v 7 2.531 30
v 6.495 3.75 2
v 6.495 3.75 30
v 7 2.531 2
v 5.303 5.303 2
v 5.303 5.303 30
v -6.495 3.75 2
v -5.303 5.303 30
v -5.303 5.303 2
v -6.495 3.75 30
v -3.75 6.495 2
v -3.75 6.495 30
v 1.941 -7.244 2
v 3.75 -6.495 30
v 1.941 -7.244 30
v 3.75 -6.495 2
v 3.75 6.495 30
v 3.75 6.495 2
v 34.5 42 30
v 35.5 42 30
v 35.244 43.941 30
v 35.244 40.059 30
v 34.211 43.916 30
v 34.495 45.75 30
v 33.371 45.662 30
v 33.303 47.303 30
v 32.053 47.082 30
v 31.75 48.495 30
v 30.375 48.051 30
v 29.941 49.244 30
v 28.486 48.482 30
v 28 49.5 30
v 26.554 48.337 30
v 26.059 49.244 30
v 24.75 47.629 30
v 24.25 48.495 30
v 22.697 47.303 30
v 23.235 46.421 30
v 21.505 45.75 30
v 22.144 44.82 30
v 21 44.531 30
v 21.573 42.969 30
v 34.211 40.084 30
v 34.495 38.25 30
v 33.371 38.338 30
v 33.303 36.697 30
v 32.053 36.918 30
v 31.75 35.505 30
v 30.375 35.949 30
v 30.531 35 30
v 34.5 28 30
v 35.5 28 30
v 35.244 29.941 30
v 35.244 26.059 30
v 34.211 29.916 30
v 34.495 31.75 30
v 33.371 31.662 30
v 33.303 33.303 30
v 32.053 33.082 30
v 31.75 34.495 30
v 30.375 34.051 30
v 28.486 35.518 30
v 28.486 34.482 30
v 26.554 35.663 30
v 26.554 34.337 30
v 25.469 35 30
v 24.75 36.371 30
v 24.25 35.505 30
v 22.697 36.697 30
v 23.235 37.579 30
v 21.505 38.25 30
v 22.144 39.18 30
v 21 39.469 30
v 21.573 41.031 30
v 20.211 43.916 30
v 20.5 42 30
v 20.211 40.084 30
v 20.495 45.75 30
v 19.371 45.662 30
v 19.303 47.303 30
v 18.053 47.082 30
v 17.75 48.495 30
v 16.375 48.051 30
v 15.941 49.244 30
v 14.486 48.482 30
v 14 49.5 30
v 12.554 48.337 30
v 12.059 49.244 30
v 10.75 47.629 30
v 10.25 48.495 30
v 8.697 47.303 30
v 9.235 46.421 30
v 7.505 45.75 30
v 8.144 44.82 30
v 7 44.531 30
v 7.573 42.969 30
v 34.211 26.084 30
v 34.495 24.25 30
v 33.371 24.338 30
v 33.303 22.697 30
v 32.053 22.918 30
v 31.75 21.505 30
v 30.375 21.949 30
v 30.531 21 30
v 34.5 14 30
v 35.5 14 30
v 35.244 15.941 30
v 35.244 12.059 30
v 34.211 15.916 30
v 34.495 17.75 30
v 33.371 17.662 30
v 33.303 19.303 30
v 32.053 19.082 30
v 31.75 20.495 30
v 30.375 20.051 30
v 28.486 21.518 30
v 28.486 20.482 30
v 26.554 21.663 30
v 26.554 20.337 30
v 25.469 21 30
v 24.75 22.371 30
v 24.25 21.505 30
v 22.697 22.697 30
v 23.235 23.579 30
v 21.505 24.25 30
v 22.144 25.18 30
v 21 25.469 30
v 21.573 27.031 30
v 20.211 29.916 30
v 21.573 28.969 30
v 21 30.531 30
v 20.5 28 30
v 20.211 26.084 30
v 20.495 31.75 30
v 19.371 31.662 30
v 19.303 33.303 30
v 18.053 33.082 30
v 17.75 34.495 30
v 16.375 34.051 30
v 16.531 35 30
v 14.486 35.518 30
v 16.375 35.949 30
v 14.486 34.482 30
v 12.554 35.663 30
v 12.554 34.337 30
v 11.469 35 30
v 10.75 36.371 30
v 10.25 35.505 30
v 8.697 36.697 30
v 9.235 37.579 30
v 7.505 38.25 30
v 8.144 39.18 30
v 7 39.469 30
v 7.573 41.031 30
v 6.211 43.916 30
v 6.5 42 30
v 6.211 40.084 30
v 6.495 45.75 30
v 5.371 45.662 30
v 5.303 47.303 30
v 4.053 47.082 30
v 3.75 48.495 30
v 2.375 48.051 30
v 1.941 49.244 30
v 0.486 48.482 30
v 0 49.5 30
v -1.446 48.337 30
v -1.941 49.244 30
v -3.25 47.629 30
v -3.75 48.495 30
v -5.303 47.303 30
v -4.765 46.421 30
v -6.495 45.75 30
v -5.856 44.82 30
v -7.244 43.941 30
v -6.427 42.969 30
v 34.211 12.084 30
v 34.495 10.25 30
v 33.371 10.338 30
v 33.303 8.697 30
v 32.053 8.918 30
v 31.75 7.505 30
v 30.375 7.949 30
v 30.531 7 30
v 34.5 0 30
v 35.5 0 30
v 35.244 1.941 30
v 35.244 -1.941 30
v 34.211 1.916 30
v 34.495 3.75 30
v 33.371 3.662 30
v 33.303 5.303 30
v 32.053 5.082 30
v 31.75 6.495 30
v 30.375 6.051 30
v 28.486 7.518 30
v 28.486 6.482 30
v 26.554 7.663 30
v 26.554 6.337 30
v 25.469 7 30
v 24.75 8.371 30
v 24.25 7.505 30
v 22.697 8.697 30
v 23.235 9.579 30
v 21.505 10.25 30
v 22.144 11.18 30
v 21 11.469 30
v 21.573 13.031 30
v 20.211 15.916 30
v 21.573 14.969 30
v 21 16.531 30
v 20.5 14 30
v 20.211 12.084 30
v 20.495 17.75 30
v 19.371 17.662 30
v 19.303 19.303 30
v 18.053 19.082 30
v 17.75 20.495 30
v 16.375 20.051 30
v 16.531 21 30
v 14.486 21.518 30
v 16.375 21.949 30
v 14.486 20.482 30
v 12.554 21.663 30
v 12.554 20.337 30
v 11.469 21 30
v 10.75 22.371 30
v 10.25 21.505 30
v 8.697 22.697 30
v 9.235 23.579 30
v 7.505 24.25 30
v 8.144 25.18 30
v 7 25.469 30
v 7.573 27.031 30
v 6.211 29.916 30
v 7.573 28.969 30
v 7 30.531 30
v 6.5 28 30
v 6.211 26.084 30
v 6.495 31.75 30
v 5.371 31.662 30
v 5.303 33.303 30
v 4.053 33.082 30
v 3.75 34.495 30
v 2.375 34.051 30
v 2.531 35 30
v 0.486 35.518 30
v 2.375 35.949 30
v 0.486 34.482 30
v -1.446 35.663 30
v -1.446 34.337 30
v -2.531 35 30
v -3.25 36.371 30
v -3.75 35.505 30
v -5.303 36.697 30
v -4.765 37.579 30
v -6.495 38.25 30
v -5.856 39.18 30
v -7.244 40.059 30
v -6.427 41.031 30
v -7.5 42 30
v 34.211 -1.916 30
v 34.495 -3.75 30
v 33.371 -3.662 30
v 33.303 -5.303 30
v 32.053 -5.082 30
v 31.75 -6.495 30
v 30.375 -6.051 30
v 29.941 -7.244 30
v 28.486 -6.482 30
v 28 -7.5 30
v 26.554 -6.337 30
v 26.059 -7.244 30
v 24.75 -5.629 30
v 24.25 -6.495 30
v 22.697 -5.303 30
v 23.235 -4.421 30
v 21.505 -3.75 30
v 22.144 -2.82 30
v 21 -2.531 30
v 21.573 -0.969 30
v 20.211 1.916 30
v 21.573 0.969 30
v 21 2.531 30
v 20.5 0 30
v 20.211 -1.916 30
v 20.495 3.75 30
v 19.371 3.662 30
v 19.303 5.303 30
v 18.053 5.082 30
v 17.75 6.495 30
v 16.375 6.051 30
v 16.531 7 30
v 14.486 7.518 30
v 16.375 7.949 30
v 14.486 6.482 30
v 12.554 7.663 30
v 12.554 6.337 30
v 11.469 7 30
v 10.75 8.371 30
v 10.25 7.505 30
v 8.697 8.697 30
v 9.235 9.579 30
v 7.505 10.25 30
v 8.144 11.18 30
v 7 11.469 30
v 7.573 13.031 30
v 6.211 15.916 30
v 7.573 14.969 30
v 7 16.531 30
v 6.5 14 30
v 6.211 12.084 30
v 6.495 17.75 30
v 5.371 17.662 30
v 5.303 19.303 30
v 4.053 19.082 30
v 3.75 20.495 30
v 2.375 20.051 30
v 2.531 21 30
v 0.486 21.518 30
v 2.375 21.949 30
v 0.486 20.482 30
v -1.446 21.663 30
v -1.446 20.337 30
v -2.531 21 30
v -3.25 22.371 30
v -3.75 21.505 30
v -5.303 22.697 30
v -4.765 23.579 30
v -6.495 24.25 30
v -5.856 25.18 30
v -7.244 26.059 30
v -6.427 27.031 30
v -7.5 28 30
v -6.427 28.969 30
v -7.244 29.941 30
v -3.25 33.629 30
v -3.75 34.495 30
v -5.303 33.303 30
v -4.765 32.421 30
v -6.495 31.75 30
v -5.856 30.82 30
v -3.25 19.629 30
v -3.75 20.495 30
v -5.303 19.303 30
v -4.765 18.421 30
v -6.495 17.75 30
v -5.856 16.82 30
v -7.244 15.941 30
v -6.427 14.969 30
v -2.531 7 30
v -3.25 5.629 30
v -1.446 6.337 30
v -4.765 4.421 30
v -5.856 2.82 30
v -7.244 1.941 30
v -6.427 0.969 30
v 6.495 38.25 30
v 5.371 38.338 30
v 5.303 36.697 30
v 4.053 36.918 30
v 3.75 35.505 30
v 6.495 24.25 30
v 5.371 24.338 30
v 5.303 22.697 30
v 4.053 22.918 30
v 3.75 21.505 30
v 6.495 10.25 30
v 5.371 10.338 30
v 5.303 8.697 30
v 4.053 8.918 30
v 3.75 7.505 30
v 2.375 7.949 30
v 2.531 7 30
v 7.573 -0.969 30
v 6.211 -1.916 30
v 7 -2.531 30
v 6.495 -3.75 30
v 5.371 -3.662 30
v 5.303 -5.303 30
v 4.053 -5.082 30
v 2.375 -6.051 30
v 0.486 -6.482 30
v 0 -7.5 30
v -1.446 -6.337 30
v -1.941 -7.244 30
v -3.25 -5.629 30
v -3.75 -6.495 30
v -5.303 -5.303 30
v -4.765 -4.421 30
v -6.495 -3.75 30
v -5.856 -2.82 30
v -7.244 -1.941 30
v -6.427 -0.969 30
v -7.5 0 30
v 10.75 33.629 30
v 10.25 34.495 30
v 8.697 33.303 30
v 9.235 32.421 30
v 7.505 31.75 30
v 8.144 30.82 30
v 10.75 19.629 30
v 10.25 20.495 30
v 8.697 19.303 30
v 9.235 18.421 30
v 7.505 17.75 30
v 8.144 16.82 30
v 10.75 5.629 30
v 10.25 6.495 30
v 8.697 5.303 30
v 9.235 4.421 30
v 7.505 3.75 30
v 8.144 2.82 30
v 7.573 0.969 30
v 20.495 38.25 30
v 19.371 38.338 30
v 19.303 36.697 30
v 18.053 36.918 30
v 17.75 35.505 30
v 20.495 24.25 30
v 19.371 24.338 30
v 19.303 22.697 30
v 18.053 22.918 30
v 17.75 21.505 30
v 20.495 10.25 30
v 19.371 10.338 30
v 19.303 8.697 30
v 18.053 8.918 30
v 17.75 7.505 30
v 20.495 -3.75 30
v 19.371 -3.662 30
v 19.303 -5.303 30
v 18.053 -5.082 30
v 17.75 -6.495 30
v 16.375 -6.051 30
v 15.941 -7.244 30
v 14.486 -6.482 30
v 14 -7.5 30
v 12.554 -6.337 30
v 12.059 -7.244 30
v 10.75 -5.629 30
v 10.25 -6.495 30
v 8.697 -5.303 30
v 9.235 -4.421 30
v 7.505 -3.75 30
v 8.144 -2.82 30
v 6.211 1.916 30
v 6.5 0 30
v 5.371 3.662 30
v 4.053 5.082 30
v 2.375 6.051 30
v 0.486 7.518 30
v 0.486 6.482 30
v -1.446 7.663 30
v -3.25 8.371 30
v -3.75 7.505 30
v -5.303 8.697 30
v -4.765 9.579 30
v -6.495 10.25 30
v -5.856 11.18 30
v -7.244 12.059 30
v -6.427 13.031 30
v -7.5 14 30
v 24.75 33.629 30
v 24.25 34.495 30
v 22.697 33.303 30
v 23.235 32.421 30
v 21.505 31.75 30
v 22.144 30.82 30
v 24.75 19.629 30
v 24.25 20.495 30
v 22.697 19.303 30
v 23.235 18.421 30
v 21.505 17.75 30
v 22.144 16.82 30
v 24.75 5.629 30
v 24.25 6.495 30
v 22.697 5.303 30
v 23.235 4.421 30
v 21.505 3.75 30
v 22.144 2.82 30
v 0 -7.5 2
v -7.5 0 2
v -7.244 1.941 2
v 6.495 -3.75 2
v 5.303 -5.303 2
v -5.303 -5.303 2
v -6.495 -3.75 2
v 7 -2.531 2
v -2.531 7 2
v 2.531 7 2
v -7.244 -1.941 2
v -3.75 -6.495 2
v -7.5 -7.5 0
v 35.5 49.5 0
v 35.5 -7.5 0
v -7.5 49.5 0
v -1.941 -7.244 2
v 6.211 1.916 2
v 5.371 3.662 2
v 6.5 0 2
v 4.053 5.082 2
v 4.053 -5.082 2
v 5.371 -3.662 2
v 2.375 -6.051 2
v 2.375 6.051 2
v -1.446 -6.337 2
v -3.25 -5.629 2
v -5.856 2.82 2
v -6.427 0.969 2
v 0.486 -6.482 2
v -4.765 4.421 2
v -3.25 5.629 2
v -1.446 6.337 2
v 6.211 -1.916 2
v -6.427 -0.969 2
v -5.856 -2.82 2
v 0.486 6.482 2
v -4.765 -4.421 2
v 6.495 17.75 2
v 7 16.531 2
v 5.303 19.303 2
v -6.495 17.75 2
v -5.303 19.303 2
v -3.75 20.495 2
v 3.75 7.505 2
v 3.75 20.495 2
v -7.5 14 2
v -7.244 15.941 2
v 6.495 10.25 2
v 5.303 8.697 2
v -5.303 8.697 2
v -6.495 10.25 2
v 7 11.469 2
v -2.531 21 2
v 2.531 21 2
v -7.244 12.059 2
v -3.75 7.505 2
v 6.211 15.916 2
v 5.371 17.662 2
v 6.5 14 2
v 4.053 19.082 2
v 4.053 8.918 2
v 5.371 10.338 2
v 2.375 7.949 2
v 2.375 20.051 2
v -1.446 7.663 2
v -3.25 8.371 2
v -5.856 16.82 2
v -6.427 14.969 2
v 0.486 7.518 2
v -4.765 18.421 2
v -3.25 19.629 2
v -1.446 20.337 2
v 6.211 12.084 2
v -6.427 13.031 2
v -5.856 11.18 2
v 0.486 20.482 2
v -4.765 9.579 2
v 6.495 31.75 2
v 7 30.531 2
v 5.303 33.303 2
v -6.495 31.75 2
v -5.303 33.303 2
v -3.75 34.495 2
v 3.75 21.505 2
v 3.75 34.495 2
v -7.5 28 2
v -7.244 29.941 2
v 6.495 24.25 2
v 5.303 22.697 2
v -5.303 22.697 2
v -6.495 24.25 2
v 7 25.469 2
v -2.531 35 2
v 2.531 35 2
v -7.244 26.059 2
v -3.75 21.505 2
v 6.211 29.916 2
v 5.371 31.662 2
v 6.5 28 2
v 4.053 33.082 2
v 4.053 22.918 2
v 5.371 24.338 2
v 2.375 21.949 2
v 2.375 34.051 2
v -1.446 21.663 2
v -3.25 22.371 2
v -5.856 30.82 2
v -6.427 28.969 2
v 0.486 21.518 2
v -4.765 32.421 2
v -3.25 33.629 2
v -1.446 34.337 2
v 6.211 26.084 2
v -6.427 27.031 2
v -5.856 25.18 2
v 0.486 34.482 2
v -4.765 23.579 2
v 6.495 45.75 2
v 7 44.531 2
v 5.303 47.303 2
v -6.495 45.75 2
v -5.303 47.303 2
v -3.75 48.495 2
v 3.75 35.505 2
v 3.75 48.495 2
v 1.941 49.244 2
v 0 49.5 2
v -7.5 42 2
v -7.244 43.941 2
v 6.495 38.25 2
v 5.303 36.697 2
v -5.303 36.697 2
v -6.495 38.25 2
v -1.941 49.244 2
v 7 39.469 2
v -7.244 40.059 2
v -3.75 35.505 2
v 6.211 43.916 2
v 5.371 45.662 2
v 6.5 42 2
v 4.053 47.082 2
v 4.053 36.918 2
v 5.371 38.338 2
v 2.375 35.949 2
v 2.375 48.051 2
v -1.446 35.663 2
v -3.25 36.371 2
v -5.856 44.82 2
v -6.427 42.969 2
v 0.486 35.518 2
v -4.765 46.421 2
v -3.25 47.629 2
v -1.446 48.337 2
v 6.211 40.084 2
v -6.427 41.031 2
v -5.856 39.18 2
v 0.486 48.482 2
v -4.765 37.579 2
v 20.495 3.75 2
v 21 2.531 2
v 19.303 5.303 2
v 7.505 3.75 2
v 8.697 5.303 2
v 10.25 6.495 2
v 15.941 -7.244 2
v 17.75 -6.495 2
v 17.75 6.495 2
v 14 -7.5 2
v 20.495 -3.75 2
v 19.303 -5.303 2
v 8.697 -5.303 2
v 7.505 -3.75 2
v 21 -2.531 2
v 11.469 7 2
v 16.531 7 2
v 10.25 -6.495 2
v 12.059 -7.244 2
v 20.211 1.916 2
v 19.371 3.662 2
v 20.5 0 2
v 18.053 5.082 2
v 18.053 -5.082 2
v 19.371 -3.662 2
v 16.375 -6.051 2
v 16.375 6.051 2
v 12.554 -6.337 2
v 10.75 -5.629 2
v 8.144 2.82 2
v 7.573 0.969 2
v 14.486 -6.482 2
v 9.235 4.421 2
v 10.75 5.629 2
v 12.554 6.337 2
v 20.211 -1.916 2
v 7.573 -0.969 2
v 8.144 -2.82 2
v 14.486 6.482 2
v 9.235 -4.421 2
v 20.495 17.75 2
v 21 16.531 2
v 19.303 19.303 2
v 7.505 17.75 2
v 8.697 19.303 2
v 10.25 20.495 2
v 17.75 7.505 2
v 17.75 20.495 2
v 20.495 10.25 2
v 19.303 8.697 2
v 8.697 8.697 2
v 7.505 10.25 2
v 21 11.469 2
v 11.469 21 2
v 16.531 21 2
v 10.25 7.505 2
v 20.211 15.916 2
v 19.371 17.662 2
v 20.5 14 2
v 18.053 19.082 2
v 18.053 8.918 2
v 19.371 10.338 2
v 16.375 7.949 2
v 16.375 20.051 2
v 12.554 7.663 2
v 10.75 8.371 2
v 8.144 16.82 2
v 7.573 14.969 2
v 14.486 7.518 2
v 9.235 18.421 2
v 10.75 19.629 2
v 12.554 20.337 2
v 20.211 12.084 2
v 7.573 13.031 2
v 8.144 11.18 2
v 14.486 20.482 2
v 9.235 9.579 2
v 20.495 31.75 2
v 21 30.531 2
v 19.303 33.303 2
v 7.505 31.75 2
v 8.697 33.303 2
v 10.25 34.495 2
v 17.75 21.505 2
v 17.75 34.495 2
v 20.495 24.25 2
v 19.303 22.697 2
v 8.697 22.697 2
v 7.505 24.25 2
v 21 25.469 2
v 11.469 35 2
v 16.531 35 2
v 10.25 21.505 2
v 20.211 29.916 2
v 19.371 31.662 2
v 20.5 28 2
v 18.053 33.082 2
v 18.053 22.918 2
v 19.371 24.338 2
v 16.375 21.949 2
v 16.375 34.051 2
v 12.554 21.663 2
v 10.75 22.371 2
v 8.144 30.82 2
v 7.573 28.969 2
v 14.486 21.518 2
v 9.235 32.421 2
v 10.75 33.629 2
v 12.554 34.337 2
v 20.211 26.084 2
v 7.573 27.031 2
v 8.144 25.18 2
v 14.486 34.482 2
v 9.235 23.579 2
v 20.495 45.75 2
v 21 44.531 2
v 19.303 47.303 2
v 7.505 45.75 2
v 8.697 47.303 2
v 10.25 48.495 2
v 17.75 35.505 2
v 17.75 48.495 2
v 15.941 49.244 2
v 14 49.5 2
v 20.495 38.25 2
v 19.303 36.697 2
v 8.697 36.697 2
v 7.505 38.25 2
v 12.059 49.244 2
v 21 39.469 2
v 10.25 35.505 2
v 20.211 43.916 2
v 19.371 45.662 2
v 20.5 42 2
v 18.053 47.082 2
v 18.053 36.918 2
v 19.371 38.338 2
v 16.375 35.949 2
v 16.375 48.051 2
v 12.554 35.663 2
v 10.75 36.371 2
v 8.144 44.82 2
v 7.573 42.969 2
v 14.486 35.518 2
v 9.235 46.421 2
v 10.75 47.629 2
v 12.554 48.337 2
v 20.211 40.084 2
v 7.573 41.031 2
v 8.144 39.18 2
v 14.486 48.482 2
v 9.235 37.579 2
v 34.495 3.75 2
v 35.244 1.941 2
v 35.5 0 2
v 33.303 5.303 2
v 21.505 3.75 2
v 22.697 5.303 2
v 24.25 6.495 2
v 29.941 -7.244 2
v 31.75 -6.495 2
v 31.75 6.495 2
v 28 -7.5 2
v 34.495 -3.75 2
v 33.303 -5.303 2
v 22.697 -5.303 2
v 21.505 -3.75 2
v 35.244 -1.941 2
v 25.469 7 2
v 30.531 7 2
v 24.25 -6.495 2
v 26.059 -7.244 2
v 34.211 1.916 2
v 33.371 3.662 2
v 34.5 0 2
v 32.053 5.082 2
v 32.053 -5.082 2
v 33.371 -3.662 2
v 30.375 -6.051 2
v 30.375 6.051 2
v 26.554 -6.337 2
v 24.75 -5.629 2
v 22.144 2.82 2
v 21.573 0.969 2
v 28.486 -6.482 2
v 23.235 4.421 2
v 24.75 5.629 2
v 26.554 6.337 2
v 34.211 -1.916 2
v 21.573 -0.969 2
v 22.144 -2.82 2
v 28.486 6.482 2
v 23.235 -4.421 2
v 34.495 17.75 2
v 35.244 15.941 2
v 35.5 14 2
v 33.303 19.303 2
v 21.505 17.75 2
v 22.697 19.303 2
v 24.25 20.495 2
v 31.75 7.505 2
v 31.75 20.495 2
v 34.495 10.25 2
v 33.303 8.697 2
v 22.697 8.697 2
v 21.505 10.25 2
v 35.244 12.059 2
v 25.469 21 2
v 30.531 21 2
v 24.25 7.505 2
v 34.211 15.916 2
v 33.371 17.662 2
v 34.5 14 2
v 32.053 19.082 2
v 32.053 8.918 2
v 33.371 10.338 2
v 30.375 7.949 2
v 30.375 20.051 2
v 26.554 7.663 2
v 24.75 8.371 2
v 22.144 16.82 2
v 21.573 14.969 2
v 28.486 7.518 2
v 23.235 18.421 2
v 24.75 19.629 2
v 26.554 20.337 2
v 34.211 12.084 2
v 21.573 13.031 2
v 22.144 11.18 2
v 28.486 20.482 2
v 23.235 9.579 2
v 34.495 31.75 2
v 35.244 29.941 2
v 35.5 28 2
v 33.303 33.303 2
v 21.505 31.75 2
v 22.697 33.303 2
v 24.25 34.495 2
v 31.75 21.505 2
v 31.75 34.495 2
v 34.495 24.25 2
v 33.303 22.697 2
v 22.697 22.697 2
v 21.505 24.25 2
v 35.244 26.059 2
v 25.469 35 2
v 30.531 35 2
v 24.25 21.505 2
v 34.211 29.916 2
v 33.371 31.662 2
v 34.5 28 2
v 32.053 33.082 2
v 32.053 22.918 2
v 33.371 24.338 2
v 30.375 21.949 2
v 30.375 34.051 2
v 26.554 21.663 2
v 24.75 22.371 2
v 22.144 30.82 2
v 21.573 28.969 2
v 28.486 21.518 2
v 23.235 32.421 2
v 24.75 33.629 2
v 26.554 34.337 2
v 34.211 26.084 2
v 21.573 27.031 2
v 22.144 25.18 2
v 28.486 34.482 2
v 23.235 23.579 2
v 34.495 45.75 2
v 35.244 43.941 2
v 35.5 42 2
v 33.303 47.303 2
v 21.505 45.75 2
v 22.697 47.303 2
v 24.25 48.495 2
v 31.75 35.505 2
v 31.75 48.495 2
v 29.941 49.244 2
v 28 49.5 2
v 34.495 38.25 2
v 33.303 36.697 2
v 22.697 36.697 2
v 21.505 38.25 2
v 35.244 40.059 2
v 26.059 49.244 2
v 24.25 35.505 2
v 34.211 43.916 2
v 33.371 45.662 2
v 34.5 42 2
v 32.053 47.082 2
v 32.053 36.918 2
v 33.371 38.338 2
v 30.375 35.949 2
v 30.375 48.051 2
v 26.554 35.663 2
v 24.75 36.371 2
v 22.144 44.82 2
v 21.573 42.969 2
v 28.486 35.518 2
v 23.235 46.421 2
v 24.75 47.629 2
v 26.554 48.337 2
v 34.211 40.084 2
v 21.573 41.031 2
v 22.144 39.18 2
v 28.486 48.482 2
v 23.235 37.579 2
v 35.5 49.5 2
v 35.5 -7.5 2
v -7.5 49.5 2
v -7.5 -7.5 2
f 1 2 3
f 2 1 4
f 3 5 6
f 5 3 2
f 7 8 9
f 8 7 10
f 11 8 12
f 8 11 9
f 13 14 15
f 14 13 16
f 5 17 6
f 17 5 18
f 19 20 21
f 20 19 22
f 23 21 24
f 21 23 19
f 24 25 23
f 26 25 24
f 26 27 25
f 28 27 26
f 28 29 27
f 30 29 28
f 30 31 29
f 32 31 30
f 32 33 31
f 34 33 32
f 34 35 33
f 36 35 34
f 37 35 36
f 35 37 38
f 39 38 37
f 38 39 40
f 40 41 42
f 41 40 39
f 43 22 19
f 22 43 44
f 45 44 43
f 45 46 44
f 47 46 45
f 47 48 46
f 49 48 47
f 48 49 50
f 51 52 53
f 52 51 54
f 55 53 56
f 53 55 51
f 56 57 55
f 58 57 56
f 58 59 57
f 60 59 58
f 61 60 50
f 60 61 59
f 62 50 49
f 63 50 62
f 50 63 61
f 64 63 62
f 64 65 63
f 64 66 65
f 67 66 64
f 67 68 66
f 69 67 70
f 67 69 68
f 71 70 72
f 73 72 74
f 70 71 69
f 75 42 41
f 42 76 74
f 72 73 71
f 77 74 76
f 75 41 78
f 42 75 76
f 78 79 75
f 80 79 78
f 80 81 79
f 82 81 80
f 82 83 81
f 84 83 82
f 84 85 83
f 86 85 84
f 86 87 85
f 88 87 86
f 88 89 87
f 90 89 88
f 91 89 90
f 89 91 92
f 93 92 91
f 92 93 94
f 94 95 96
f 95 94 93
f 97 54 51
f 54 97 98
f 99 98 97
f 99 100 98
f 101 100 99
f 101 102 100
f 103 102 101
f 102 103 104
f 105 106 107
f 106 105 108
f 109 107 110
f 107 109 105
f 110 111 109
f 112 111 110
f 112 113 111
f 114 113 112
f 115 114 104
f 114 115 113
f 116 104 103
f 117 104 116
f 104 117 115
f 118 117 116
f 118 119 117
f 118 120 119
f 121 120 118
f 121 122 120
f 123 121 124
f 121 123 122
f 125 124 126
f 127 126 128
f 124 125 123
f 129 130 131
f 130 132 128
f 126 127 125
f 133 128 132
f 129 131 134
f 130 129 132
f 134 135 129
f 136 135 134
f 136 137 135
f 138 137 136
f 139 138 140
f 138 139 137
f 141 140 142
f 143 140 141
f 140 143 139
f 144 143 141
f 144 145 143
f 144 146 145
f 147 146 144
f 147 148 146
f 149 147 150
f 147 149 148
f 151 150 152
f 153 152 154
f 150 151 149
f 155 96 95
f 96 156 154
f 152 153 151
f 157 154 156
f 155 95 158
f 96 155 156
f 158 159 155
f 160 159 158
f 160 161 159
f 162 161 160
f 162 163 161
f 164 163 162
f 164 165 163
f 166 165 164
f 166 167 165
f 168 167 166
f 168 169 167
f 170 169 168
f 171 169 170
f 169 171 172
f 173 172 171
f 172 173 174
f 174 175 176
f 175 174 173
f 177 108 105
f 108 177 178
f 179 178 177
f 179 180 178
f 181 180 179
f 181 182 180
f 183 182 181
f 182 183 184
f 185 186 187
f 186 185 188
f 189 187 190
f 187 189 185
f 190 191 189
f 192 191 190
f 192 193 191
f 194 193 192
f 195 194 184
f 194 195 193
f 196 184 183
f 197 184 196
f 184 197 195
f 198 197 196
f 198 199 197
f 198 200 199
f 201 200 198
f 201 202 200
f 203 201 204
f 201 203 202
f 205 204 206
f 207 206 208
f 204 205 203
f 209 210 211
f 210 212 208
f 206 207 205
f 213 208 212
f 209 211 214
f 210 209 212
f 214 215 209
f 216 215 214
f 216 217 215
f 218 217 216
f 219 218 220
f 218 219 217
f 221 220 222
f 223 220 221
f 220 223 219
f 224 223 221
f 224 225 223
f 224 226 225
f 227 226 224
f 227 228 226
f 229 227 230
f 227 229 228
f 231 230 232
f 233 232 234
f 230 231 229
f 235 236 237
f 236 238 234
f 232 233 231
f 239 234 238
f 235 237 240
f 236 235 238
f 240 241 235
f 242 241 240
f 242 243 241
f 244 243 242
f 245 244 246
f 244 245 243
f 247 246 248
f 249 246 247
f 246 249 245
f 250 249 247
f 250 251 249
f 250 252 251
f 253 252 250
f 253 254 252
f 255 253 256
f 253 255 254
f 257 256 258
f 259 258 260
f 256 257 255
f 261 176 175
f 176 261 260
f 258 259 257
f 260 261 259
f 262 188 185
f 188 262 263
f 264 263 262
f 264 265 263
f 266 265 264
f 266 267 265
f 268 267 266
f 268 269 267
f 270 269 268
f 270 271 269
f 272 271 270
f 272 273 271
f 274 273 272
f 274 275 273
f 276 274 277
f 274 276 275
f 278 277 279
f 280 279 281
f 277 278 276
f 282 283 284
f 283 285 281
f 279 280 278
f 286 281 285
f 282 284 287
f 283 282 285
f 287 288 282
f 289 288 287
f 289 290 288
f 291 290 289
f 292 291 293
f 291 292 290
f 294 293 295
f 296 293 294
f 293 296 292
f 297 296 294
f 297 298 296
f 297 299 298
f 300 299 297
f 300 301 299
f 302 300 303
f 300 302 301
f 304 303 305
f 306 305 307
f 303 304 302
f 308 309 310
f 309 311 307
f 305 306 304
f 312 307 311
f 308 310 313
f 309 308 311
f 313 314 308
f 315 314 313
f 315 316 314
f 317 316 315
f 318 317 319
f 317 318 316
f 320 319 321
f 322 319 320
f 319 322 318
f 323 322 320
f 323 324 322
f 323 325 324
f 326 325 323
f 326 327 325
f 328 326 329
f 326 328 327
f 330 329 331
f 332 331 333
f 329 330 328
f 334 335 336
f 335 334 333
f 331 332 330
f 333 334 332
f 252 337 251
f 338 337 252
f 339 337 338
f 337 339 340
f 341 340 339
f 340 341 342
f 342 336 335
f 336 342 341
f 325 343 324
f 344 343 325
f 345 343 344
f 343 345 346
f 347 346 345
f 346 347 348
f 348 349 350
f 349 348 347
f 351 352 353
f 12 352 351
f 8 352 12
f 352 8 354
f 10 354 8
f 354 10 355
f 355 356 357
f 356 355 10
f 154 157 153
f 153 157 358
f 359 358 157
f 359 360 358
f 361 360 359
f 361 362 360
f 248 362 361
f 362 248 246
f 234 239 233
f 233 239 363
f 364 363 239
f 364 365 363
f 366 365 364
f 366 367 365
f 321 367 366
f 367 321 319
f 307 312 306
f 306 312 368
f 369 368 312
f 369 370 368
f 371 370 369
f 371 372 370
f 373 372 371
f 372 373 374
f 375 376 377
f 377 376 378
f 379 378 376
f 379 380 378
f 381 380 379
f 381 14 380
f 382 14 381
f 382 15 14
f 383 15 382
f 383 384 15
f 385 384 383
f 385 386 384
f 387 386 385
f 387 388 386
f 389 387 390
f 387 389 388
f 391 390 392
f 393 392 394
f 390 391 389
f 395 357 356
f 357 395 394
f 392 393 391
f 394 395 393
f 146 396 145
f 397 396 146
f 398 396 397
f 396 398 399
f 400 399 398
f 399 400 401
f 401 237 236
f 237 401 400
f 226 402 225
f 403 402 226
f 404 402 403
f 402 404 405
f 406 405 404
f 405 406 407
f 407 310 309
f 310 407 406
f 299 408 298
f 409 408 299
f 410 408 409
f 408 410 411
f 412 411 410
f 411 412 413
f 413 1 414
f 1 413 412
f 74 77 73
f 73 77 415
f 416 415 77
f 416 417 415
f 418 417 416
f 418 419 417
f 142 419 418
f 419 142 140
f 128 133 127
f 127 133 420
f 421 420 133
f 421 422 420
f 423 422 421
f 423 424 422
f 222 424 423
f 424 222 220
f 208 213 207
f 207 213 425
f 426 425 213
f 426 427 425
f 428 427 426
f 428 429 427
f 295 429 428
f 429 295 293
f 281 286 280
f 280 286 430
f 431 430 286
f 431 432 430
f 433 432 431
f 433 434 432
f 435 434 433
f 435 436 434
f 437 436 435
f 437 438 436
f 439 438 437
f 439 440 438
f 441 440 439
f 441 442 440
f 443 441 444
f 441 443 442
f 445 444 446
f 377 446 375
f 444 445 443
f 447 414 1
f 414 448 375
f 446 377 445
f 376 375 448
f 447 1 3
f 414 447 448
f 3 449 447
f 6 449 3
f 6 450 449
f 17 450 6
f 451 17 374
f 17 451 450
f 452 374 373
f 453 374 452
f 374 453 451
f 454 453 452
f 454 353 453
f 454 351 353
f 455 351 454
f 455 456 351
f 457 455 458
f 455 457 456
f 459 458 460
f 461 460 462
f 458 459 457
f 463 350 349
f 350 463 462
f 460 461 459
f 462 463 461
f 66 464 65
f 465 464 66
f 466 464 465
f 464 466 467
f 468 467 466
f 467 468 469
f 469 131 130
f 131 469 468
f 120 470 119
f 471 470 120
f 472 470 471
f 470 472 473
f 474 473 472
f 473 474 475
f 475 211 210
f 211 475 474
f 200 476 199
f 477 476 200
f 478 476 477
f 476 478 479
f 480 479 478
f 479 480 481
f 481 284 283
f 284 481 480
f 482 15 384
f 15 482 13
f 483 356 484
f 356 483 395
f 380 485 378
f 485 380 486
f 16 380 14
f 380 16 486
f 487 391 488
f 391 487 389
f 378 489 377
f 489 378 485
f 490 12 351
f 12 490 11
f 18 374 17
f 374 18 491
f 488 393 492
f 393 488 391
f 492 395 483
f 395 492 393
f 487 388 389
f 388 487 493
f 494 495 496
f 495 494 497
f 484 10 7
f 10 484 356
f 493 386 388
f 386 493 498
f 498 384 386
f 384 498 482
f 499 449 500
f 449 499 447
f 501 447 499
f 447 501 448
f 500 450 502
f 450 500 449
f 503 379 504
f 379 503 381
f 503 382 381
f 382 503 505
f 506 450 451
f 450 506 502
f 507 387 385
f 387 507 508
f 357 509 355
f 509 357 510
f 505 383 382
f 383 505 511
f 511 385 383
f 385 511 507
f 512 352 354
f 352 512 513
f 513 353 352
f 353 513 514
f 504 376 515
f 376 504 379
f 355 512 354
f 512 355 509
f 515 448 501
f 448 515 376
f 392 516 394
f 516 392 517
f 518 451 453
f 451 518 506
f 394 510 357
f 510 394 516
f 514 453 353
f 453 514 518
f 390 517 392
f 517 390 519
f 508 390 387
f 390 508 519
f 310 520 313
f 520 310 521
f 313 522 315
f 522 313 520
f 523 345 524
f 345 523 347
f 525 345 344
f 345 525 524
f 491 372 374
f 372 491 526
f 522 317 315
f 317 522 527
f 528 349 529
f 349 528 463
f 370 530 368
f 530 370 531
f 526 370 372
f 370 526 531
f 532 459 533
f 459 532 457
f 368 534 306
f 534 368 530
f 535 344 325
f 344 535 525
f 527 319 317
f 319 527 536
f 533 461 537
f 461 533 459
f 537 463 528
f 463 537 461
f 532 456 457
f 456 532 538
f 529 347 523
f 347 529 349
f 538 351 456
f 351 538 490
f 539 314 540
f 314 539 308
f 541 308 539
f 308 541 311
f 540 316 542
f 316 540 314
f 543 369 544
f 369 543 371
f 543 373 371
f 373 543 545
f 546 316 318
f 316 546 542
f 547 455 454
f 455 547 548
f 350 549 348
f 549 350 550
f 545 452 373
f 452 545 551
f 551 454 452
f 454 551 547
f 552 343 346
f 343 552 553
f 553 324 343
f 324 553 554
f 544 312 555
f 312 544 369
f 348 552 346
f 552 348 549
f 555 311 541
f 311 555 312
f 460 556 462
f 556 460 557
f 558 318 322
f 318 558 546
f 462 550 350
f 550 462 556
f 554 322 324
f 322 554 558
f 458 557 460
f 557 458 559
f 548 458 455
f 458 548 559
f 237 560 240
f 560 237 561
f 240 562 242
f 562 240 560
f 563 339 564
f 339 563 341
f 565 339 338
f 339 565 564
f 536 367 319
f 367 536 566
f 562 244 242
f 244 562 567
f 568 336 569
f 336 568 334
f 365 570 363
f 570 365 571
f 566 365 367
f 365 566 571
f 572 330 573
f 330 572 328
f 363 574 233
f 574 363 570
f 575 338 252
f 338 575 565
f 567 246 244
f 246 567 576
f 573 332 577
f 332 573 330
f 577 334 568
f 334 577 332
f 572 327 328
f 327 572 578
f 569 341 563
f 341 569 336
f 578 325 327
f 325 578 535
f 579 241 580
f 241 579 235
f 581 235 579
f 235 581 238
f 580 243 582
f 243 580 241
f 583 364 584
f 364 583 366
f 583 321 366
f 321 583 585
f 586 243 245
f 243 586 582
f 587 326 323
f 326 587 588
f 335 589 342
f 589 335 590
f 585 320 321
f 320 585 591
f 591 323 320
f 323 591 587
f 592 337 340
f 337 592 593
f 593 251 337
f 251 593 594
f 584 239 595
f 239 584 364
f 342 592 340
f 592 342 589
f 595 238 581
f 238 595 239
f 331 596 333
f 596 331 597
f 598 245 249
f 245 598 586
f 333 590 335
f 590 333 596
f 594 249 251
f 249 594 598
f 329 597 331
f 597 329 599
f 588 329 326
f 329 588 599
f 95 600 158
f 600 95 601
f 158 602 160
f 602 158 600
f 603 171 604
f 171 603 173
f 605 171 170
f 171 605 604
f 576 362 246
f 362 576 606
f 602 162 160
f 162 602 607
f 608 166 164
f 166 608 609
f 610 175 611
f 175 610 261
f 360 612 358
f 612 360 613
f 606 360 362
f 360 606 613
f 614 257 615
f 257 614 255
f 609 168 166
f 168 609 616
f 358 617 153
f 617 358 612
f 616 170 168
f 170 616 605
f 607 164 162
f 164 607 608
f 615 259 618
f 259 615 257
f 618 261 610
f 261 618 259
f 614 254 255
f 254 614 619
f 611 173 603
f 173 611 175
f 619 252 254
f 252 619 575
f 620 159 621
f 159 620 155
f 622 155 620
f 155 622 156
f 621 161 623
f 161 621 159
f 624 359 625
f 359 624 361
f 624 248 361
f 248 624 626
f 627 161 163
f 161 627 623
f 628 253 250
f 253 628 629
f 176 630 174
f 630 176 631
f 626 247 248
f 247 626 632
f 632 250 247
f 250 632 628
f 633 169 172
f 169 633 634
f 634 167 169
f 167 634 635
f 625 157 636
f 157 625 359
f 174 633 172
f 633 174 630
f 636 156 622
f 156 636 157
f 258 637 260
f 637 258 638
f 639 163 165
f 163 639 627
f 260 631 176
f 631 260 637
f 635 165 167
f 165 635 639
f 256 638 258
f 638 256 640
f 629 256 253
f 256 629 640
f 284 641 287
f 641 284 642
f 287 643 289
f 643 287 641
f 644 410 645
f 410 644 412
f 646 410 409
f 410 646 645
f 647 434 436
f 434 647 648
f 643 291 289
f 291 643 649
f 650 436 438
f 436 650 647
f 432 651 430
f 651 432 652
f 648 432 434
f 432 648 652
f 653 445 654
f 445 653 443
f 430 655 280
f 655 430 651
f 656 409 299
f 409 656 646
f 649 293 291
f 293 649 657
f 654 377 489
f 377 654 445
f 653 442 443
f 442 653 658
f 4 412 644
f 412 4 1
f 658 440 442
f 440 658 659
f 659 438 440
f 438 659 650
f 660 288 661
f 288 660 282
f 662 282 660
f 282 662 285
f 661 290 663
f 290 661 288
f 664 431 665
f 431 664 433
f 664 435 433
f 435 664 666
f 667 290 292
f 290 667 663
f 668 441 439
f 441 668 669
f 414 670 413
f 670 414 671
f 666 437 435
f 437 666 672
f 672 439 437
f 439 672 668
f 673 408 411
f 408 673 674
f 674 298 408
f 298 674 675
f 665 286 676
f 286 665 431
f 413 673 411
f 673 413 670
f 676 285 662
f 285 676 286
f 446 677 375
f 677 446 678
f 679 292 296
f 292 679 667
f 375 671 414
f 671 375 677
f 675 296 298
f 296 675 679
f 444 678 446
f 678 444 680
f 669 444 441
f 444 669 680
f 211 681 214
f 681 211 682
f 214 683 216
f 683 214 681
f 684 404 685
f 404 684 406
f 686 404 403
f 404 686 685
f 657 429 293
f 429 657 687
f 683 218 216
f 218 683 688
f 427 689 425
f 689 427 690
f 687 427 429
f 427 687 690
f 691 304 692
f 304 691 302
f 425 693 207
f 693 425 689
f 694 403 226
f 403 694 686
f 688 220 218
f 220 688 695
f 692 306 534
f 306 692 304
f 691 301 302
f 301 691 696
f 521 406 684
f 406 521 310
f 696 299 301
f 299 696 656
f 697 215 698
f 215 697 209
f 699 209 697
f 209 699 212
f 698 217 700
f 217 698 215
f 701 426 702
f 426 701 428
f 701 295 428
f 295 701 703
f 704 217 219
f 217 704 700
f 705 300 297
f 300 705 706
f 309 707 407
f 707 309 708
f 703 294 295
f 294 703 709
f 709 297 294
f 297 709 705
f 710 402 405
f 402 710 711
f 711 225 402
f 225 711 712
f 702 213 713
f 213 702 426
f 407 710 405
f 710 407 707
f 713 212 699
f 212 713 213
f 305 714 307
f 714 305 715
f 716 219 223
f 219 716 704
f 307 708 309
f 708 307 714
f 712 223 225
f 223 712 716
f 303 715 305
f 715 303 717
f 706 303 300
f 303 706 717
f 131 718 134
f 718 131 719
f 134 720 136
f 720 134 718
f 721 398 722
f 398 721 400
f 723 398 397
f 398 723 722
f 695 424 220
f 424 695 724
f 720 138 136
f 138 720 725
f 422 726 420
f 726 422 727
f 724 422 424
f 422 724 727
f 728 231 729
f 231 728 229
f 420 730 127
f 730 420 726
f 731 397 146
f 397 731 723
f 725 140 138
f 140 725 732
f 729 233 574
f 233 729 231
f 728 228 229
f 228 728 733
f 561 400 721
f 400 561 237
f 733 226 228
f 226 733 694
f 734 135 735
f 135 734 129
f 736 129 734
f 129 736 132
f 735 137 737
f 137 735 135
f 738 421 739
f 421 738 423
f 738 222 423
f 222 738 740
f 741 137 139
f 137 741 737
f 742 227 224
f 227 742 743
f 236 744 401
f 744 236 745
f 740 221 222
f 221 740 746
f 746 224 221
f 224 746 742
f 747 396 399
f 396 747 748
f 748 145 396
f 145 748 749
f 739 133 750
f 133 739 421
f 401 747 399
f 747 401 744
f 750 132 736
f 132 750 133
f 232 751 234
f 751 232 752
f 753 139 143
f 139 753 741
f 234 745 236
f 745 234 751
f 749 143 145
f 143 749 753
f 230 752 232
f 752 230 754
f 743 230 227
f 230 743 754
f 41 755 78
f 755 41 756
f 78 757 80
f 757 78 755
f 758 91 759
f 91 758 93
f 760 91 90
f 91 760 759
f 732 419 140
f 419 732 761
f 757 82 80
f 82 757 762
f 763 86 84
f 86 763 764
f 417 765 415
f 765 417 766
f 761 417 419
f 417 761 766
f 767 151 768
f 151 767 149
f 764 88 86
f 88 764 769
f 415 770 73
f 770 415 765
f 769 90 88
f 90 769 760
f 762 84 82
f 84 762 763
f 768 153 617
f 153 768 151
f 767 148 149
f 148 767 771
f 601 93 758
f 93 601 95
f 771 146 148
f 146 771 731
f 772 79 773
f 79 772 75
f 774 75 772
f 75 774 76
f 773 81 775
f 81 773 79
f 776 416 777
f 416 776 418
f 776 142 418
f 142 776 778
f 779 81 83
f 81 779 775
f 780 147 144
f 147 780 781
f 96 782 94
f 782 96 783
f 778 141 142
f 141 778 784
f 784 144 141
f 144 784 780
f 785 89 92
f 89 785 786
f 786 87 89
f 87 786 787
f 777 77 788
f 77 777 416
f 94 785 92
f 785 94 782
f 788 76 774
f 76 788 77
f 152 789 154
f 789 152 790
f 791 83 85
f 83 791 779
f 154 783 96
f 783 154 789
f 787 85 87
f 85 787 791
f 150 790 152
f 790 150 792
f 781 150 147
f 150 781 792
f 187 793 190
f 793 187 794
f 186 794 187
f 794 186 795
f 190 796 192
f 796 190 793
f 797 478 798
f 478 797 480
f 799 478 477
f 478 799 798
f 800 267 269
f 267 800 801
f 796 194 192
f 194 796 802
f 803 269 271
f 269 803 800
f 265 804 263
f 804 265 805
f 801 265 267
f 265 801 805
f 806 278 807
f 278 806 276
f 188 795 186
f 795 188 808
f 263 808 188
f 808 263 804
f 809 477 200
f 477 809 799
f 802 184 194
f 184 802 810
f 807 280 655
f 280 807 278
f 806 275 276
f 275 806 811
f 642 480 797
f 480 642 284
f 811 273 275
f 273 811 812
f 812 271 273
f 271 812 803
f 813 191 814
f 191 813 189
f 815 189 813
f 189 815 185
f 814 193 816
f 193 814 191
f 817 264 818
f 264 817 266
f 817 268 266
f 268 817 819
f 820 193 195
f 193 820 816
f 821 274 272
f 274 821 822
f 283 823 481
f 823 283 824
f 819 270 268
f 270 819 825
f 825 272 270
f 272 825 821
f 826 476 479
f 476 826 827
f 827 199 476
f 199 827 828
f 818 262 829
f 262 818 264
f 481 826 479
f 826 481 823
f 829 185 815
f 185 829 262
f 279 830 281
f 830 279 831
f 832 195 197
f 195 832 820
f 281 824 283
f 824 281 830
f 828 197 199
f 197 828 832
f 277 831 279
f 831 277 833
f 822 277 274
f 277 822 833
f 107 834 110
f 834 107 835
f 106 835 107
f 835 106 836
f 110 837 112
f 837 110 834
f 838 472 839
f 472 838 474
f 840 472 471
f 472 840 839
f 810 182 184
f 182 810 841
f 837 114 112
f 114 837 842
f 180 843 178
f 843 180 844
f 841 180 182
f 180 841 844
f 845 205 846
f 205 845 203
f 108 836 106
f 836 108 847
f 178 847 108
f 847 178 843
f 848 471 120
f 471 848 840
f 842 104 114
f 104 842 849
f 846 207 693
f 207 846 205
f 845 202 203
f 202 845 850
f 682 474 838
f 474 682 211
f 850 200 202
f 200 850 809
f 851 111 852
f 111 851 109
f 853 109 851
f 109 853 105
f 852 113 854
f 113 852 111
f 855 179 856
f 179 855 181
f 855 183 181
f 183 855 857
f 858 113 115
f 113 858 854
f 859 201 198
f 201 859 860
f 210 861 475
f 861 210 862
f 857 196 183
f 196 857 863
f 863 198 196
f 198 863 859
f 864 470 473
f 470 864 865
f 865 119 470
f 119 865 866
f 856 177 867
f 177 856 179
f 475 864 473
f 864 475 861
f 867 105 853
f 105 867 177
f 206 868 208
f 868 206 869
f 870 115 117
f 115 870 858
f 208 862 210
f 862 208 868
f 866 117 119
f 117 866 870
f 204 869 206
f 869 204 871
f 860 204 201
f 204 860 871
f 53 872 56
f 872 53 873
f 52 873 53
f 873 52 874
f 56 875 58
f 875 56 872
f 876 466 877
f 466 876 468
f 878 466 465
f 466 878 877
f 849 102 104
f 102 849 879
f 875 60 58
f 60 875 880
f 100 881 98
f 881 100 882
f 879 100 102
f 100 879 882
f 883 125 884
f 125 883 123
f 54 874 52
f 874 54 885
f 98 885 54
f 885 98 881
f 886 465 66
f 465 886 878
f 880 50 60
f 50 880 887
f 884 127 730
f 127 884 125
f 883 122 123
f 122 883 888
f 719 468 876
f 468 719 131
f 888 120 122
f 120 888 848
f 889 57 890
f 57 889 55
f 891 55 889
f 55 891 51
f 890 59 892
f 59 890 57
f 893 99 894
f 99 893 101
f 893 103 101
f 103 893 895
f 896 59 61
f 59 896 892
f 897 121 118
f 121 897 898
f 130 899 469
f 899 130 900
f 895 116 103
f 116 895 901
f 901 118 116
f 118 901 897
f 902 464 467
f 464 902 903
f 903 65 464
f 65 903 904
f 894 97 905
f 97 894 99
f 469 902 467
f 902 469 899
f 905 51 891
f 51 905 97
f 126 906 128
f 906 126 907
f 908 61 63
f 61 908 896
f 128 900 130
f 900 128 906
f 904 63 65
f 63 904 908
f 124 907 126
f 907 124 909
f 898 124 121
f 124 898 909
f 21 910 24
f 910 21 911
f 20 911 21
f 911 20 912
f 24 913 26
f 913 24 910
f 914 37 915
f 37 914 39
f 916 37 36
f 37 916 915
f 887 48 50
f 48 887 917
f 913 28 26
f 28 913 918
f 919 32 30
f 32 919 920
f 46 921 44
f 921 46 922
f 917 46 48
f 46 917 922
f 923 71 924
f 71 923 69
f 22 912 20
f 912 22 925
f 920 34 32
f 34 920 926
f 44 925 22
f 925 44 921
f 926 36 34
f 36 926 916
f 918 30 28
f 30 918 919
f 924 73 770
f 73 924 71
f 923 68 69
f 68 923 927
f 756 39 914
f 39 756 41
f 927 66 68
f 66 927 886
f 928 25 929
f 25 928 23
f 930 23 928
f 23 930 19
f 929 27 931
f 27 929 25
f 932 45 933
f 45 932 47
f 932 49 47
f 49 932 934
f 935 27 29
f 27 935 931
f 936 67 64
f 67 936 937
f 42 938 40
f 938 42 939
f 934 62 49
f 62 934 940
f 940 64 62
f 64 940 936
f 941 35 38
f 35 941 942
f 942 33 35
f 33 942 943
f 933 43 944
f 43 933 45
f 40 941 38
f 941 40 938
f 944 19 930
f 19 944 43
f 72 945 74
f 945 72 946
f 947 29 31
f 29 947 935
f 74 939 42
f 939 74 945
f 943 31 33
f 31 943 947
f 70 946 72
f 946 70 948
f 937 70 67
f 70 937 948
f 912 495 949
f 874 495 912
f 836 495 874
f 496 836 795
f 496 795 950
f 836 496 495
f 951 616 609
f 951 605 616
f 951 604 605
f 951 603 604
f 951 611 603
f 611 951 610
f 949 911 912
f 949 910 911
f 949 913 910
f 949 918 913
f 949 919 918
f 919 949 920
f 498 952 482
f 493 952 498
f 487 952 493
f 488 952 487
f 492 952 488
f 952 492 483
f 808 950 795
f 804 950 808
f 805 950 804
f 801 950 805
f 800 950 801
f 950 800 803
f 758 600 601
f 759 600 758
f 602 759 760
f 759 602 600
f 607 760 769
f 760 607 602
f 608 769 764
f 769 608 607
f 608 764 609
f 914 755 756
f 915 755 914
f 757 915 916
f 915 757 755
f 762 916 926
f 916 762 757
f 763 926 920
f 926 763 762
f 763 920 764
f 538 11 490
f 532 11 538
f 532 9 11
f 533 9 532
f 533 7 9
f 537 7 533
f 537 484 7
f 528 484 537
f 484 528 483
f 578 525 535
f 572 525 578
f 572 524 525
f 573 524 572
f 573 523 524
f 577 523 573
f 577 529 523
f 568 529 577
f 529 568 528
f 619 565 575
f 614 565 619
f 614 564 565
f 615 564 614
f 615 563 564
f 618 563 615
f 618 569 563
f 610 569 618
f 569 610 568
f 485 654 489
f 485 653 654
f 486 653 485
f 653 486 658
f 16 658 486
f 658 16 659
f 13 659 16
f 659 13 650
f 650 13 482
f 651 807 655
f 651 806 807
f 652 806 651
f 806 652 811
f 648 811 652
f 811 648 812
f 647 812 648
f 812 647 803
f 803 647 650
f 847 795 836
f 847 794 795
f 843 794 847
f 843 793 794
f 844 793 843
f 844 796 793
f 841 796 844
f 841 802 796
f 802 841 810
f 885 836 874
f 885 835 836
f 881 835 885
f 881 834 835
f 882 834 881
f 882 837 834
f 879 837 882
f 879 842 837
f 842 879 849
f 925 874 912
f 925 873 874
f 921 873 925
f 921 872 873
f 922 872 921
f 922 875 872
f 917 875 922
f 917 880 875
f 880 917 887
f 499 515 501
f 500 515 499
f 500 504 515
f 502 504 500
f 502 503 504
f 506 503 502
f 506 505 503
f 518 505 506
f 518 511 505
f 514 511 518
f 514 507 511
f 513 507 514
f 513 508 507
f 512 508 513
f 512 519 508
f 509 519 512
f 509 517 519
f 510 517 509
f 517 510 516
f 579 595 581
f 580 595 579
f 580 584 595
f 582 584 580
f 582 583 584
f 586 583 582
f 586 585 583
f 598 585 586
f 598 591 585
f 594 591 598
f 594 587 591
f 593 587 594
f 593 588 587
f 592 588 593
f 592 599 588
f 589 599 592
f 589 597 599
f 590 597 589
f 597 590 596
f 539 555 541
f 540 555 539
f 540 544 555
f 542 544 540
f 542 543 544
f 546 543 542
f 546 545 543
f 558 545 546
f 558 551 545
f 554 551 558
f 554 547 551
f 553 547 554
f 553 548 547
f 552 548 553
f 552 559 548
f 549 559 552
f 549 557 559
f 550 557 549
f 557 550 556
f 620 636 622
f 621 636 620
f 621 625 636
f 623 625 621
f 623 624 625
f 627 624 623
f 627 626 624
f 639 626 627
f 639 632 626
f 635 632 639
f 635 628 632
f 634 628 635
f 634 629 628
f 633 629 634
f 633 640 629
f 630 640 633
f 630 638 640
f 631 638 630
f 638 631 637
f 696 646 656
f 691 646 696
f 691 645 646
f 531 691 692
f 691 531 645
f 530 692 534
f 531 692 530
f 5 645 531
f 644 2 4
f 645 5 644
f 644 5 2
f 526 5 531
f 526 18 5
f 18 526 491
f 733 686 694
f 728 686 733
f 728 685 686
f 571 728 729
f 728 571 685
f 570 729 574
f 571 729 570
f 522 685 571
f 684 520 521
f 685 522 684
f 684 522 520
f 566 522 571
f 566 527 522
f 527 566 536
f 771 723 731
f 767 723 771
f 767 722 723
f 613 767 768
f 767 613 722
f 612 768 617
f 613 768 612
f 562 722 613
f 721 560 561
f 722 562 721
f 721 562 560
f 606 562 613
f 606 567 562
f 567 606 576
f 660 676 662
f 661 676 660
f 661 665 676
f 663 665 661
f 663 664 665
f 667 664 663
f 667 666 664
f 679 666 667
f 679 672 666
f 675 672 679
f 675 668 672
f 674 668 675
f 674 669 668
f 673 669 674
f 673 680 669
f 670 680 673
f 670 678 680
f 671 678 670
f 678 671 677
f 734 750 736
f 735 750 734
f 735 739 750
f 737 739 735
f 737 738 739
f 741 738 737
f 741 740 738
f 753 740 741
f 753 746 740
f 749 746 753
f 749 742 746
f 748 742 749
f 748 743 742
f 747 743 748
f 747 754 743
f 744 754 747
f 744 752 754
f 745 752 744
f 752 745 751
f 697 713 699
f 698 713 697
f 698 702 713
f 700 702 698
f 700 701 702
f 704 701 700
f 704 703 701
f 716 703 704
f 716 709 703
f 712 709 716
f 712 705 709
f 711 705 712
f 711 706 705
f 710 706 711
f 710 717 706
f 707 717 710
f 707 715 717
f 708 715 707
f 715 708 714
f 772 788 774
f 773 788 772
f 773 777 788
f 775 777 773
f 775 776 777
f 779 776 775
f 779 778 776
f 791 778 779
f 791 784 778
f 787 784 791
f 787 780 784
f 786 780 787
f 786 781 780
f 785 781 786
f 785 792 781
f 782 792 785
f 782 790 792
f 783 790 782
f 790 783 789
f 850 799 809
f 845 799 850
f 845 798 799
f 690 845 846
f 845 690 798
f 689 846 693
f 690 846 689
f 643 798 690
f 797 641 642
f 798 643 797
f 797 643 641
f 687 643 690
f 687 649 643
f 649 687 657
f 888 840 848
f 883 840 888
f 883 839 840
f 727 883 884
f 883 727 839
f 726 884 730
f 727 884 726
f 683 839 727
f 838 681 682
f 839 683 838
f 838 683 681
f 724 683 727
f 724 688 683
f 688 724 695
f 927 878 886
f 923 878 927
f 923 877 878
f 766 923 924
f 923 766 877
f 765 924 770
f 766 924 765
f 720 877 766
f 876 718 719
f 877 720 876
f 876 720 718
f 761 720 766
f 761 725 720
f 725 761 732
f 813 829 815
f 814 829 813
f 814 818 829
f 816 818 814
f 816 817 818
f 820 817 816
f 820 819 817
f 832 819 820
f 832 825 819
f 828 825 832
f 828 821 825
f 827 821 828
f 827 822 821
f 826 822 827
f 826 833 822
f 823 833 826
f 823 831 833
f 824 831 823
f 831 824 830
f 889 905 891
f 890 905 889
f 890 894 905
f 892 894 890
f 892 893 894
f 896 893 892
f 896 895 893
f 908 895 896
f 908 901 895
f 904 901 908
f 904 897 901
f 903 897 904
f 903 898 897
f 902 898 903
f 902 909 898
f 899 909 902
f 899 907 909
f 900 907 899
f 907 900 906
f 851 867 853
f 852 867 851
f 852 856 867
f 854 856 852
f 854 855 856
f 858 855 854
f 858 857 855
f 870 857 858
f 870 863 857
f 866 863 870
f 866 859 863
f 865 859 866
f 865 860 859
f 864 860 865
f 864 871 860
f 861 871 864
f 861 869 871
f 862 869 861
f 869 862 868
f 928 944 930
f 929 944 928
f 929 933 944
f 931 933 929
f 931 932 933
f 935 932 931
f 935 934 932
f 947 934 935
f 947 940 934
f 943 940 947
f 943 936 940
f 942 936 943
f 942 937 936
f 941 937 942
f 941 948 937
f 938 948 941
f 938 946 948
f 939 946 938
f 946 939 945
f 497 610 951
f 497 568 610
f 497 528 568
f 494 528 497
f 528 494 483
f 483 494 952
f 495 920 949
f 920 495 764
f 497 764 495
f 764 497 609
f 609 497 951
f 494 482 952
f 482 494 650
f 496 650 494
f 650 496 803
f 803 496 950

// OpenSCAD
// Customizable screw driver stand
// Created by Kjell Kernen
// Date 30.9.2015

/*[Pattern Parameters]*/
// of screw drivers:
rows=3;       // [2:5]

// of screw drivers per row:
number=4;     // [2:6]

// of the stand in mm:
height=30;    // [15:50]

// of the screw driver tubes in mm:
inner_diameter=14;  // [10:40]


/*[Hidden]*/
diameter = inner_diameter+1;
/* Modules */

module tube(height,width)
{
	difference()
	{
		cylinder(r=(width/2),    h=height);	
		translate([0,0,-1])
           cylinder(r=(width/2 -1), h=height+2);
	}
}

// Drawing starts here ********************************************

//Base
translate([-diameter/2,-diameter/2,0])
    cube([rows*(diameter-1)+1,number*(diameter-1)+1,2]); 

        
//Tubes
for (xi=[0:1:rows-1])
    for(yi=[0:1:number-1])
        translate([xi*(diameter-1),yi*(diameter-1),0])
            tube (height, diameter);
